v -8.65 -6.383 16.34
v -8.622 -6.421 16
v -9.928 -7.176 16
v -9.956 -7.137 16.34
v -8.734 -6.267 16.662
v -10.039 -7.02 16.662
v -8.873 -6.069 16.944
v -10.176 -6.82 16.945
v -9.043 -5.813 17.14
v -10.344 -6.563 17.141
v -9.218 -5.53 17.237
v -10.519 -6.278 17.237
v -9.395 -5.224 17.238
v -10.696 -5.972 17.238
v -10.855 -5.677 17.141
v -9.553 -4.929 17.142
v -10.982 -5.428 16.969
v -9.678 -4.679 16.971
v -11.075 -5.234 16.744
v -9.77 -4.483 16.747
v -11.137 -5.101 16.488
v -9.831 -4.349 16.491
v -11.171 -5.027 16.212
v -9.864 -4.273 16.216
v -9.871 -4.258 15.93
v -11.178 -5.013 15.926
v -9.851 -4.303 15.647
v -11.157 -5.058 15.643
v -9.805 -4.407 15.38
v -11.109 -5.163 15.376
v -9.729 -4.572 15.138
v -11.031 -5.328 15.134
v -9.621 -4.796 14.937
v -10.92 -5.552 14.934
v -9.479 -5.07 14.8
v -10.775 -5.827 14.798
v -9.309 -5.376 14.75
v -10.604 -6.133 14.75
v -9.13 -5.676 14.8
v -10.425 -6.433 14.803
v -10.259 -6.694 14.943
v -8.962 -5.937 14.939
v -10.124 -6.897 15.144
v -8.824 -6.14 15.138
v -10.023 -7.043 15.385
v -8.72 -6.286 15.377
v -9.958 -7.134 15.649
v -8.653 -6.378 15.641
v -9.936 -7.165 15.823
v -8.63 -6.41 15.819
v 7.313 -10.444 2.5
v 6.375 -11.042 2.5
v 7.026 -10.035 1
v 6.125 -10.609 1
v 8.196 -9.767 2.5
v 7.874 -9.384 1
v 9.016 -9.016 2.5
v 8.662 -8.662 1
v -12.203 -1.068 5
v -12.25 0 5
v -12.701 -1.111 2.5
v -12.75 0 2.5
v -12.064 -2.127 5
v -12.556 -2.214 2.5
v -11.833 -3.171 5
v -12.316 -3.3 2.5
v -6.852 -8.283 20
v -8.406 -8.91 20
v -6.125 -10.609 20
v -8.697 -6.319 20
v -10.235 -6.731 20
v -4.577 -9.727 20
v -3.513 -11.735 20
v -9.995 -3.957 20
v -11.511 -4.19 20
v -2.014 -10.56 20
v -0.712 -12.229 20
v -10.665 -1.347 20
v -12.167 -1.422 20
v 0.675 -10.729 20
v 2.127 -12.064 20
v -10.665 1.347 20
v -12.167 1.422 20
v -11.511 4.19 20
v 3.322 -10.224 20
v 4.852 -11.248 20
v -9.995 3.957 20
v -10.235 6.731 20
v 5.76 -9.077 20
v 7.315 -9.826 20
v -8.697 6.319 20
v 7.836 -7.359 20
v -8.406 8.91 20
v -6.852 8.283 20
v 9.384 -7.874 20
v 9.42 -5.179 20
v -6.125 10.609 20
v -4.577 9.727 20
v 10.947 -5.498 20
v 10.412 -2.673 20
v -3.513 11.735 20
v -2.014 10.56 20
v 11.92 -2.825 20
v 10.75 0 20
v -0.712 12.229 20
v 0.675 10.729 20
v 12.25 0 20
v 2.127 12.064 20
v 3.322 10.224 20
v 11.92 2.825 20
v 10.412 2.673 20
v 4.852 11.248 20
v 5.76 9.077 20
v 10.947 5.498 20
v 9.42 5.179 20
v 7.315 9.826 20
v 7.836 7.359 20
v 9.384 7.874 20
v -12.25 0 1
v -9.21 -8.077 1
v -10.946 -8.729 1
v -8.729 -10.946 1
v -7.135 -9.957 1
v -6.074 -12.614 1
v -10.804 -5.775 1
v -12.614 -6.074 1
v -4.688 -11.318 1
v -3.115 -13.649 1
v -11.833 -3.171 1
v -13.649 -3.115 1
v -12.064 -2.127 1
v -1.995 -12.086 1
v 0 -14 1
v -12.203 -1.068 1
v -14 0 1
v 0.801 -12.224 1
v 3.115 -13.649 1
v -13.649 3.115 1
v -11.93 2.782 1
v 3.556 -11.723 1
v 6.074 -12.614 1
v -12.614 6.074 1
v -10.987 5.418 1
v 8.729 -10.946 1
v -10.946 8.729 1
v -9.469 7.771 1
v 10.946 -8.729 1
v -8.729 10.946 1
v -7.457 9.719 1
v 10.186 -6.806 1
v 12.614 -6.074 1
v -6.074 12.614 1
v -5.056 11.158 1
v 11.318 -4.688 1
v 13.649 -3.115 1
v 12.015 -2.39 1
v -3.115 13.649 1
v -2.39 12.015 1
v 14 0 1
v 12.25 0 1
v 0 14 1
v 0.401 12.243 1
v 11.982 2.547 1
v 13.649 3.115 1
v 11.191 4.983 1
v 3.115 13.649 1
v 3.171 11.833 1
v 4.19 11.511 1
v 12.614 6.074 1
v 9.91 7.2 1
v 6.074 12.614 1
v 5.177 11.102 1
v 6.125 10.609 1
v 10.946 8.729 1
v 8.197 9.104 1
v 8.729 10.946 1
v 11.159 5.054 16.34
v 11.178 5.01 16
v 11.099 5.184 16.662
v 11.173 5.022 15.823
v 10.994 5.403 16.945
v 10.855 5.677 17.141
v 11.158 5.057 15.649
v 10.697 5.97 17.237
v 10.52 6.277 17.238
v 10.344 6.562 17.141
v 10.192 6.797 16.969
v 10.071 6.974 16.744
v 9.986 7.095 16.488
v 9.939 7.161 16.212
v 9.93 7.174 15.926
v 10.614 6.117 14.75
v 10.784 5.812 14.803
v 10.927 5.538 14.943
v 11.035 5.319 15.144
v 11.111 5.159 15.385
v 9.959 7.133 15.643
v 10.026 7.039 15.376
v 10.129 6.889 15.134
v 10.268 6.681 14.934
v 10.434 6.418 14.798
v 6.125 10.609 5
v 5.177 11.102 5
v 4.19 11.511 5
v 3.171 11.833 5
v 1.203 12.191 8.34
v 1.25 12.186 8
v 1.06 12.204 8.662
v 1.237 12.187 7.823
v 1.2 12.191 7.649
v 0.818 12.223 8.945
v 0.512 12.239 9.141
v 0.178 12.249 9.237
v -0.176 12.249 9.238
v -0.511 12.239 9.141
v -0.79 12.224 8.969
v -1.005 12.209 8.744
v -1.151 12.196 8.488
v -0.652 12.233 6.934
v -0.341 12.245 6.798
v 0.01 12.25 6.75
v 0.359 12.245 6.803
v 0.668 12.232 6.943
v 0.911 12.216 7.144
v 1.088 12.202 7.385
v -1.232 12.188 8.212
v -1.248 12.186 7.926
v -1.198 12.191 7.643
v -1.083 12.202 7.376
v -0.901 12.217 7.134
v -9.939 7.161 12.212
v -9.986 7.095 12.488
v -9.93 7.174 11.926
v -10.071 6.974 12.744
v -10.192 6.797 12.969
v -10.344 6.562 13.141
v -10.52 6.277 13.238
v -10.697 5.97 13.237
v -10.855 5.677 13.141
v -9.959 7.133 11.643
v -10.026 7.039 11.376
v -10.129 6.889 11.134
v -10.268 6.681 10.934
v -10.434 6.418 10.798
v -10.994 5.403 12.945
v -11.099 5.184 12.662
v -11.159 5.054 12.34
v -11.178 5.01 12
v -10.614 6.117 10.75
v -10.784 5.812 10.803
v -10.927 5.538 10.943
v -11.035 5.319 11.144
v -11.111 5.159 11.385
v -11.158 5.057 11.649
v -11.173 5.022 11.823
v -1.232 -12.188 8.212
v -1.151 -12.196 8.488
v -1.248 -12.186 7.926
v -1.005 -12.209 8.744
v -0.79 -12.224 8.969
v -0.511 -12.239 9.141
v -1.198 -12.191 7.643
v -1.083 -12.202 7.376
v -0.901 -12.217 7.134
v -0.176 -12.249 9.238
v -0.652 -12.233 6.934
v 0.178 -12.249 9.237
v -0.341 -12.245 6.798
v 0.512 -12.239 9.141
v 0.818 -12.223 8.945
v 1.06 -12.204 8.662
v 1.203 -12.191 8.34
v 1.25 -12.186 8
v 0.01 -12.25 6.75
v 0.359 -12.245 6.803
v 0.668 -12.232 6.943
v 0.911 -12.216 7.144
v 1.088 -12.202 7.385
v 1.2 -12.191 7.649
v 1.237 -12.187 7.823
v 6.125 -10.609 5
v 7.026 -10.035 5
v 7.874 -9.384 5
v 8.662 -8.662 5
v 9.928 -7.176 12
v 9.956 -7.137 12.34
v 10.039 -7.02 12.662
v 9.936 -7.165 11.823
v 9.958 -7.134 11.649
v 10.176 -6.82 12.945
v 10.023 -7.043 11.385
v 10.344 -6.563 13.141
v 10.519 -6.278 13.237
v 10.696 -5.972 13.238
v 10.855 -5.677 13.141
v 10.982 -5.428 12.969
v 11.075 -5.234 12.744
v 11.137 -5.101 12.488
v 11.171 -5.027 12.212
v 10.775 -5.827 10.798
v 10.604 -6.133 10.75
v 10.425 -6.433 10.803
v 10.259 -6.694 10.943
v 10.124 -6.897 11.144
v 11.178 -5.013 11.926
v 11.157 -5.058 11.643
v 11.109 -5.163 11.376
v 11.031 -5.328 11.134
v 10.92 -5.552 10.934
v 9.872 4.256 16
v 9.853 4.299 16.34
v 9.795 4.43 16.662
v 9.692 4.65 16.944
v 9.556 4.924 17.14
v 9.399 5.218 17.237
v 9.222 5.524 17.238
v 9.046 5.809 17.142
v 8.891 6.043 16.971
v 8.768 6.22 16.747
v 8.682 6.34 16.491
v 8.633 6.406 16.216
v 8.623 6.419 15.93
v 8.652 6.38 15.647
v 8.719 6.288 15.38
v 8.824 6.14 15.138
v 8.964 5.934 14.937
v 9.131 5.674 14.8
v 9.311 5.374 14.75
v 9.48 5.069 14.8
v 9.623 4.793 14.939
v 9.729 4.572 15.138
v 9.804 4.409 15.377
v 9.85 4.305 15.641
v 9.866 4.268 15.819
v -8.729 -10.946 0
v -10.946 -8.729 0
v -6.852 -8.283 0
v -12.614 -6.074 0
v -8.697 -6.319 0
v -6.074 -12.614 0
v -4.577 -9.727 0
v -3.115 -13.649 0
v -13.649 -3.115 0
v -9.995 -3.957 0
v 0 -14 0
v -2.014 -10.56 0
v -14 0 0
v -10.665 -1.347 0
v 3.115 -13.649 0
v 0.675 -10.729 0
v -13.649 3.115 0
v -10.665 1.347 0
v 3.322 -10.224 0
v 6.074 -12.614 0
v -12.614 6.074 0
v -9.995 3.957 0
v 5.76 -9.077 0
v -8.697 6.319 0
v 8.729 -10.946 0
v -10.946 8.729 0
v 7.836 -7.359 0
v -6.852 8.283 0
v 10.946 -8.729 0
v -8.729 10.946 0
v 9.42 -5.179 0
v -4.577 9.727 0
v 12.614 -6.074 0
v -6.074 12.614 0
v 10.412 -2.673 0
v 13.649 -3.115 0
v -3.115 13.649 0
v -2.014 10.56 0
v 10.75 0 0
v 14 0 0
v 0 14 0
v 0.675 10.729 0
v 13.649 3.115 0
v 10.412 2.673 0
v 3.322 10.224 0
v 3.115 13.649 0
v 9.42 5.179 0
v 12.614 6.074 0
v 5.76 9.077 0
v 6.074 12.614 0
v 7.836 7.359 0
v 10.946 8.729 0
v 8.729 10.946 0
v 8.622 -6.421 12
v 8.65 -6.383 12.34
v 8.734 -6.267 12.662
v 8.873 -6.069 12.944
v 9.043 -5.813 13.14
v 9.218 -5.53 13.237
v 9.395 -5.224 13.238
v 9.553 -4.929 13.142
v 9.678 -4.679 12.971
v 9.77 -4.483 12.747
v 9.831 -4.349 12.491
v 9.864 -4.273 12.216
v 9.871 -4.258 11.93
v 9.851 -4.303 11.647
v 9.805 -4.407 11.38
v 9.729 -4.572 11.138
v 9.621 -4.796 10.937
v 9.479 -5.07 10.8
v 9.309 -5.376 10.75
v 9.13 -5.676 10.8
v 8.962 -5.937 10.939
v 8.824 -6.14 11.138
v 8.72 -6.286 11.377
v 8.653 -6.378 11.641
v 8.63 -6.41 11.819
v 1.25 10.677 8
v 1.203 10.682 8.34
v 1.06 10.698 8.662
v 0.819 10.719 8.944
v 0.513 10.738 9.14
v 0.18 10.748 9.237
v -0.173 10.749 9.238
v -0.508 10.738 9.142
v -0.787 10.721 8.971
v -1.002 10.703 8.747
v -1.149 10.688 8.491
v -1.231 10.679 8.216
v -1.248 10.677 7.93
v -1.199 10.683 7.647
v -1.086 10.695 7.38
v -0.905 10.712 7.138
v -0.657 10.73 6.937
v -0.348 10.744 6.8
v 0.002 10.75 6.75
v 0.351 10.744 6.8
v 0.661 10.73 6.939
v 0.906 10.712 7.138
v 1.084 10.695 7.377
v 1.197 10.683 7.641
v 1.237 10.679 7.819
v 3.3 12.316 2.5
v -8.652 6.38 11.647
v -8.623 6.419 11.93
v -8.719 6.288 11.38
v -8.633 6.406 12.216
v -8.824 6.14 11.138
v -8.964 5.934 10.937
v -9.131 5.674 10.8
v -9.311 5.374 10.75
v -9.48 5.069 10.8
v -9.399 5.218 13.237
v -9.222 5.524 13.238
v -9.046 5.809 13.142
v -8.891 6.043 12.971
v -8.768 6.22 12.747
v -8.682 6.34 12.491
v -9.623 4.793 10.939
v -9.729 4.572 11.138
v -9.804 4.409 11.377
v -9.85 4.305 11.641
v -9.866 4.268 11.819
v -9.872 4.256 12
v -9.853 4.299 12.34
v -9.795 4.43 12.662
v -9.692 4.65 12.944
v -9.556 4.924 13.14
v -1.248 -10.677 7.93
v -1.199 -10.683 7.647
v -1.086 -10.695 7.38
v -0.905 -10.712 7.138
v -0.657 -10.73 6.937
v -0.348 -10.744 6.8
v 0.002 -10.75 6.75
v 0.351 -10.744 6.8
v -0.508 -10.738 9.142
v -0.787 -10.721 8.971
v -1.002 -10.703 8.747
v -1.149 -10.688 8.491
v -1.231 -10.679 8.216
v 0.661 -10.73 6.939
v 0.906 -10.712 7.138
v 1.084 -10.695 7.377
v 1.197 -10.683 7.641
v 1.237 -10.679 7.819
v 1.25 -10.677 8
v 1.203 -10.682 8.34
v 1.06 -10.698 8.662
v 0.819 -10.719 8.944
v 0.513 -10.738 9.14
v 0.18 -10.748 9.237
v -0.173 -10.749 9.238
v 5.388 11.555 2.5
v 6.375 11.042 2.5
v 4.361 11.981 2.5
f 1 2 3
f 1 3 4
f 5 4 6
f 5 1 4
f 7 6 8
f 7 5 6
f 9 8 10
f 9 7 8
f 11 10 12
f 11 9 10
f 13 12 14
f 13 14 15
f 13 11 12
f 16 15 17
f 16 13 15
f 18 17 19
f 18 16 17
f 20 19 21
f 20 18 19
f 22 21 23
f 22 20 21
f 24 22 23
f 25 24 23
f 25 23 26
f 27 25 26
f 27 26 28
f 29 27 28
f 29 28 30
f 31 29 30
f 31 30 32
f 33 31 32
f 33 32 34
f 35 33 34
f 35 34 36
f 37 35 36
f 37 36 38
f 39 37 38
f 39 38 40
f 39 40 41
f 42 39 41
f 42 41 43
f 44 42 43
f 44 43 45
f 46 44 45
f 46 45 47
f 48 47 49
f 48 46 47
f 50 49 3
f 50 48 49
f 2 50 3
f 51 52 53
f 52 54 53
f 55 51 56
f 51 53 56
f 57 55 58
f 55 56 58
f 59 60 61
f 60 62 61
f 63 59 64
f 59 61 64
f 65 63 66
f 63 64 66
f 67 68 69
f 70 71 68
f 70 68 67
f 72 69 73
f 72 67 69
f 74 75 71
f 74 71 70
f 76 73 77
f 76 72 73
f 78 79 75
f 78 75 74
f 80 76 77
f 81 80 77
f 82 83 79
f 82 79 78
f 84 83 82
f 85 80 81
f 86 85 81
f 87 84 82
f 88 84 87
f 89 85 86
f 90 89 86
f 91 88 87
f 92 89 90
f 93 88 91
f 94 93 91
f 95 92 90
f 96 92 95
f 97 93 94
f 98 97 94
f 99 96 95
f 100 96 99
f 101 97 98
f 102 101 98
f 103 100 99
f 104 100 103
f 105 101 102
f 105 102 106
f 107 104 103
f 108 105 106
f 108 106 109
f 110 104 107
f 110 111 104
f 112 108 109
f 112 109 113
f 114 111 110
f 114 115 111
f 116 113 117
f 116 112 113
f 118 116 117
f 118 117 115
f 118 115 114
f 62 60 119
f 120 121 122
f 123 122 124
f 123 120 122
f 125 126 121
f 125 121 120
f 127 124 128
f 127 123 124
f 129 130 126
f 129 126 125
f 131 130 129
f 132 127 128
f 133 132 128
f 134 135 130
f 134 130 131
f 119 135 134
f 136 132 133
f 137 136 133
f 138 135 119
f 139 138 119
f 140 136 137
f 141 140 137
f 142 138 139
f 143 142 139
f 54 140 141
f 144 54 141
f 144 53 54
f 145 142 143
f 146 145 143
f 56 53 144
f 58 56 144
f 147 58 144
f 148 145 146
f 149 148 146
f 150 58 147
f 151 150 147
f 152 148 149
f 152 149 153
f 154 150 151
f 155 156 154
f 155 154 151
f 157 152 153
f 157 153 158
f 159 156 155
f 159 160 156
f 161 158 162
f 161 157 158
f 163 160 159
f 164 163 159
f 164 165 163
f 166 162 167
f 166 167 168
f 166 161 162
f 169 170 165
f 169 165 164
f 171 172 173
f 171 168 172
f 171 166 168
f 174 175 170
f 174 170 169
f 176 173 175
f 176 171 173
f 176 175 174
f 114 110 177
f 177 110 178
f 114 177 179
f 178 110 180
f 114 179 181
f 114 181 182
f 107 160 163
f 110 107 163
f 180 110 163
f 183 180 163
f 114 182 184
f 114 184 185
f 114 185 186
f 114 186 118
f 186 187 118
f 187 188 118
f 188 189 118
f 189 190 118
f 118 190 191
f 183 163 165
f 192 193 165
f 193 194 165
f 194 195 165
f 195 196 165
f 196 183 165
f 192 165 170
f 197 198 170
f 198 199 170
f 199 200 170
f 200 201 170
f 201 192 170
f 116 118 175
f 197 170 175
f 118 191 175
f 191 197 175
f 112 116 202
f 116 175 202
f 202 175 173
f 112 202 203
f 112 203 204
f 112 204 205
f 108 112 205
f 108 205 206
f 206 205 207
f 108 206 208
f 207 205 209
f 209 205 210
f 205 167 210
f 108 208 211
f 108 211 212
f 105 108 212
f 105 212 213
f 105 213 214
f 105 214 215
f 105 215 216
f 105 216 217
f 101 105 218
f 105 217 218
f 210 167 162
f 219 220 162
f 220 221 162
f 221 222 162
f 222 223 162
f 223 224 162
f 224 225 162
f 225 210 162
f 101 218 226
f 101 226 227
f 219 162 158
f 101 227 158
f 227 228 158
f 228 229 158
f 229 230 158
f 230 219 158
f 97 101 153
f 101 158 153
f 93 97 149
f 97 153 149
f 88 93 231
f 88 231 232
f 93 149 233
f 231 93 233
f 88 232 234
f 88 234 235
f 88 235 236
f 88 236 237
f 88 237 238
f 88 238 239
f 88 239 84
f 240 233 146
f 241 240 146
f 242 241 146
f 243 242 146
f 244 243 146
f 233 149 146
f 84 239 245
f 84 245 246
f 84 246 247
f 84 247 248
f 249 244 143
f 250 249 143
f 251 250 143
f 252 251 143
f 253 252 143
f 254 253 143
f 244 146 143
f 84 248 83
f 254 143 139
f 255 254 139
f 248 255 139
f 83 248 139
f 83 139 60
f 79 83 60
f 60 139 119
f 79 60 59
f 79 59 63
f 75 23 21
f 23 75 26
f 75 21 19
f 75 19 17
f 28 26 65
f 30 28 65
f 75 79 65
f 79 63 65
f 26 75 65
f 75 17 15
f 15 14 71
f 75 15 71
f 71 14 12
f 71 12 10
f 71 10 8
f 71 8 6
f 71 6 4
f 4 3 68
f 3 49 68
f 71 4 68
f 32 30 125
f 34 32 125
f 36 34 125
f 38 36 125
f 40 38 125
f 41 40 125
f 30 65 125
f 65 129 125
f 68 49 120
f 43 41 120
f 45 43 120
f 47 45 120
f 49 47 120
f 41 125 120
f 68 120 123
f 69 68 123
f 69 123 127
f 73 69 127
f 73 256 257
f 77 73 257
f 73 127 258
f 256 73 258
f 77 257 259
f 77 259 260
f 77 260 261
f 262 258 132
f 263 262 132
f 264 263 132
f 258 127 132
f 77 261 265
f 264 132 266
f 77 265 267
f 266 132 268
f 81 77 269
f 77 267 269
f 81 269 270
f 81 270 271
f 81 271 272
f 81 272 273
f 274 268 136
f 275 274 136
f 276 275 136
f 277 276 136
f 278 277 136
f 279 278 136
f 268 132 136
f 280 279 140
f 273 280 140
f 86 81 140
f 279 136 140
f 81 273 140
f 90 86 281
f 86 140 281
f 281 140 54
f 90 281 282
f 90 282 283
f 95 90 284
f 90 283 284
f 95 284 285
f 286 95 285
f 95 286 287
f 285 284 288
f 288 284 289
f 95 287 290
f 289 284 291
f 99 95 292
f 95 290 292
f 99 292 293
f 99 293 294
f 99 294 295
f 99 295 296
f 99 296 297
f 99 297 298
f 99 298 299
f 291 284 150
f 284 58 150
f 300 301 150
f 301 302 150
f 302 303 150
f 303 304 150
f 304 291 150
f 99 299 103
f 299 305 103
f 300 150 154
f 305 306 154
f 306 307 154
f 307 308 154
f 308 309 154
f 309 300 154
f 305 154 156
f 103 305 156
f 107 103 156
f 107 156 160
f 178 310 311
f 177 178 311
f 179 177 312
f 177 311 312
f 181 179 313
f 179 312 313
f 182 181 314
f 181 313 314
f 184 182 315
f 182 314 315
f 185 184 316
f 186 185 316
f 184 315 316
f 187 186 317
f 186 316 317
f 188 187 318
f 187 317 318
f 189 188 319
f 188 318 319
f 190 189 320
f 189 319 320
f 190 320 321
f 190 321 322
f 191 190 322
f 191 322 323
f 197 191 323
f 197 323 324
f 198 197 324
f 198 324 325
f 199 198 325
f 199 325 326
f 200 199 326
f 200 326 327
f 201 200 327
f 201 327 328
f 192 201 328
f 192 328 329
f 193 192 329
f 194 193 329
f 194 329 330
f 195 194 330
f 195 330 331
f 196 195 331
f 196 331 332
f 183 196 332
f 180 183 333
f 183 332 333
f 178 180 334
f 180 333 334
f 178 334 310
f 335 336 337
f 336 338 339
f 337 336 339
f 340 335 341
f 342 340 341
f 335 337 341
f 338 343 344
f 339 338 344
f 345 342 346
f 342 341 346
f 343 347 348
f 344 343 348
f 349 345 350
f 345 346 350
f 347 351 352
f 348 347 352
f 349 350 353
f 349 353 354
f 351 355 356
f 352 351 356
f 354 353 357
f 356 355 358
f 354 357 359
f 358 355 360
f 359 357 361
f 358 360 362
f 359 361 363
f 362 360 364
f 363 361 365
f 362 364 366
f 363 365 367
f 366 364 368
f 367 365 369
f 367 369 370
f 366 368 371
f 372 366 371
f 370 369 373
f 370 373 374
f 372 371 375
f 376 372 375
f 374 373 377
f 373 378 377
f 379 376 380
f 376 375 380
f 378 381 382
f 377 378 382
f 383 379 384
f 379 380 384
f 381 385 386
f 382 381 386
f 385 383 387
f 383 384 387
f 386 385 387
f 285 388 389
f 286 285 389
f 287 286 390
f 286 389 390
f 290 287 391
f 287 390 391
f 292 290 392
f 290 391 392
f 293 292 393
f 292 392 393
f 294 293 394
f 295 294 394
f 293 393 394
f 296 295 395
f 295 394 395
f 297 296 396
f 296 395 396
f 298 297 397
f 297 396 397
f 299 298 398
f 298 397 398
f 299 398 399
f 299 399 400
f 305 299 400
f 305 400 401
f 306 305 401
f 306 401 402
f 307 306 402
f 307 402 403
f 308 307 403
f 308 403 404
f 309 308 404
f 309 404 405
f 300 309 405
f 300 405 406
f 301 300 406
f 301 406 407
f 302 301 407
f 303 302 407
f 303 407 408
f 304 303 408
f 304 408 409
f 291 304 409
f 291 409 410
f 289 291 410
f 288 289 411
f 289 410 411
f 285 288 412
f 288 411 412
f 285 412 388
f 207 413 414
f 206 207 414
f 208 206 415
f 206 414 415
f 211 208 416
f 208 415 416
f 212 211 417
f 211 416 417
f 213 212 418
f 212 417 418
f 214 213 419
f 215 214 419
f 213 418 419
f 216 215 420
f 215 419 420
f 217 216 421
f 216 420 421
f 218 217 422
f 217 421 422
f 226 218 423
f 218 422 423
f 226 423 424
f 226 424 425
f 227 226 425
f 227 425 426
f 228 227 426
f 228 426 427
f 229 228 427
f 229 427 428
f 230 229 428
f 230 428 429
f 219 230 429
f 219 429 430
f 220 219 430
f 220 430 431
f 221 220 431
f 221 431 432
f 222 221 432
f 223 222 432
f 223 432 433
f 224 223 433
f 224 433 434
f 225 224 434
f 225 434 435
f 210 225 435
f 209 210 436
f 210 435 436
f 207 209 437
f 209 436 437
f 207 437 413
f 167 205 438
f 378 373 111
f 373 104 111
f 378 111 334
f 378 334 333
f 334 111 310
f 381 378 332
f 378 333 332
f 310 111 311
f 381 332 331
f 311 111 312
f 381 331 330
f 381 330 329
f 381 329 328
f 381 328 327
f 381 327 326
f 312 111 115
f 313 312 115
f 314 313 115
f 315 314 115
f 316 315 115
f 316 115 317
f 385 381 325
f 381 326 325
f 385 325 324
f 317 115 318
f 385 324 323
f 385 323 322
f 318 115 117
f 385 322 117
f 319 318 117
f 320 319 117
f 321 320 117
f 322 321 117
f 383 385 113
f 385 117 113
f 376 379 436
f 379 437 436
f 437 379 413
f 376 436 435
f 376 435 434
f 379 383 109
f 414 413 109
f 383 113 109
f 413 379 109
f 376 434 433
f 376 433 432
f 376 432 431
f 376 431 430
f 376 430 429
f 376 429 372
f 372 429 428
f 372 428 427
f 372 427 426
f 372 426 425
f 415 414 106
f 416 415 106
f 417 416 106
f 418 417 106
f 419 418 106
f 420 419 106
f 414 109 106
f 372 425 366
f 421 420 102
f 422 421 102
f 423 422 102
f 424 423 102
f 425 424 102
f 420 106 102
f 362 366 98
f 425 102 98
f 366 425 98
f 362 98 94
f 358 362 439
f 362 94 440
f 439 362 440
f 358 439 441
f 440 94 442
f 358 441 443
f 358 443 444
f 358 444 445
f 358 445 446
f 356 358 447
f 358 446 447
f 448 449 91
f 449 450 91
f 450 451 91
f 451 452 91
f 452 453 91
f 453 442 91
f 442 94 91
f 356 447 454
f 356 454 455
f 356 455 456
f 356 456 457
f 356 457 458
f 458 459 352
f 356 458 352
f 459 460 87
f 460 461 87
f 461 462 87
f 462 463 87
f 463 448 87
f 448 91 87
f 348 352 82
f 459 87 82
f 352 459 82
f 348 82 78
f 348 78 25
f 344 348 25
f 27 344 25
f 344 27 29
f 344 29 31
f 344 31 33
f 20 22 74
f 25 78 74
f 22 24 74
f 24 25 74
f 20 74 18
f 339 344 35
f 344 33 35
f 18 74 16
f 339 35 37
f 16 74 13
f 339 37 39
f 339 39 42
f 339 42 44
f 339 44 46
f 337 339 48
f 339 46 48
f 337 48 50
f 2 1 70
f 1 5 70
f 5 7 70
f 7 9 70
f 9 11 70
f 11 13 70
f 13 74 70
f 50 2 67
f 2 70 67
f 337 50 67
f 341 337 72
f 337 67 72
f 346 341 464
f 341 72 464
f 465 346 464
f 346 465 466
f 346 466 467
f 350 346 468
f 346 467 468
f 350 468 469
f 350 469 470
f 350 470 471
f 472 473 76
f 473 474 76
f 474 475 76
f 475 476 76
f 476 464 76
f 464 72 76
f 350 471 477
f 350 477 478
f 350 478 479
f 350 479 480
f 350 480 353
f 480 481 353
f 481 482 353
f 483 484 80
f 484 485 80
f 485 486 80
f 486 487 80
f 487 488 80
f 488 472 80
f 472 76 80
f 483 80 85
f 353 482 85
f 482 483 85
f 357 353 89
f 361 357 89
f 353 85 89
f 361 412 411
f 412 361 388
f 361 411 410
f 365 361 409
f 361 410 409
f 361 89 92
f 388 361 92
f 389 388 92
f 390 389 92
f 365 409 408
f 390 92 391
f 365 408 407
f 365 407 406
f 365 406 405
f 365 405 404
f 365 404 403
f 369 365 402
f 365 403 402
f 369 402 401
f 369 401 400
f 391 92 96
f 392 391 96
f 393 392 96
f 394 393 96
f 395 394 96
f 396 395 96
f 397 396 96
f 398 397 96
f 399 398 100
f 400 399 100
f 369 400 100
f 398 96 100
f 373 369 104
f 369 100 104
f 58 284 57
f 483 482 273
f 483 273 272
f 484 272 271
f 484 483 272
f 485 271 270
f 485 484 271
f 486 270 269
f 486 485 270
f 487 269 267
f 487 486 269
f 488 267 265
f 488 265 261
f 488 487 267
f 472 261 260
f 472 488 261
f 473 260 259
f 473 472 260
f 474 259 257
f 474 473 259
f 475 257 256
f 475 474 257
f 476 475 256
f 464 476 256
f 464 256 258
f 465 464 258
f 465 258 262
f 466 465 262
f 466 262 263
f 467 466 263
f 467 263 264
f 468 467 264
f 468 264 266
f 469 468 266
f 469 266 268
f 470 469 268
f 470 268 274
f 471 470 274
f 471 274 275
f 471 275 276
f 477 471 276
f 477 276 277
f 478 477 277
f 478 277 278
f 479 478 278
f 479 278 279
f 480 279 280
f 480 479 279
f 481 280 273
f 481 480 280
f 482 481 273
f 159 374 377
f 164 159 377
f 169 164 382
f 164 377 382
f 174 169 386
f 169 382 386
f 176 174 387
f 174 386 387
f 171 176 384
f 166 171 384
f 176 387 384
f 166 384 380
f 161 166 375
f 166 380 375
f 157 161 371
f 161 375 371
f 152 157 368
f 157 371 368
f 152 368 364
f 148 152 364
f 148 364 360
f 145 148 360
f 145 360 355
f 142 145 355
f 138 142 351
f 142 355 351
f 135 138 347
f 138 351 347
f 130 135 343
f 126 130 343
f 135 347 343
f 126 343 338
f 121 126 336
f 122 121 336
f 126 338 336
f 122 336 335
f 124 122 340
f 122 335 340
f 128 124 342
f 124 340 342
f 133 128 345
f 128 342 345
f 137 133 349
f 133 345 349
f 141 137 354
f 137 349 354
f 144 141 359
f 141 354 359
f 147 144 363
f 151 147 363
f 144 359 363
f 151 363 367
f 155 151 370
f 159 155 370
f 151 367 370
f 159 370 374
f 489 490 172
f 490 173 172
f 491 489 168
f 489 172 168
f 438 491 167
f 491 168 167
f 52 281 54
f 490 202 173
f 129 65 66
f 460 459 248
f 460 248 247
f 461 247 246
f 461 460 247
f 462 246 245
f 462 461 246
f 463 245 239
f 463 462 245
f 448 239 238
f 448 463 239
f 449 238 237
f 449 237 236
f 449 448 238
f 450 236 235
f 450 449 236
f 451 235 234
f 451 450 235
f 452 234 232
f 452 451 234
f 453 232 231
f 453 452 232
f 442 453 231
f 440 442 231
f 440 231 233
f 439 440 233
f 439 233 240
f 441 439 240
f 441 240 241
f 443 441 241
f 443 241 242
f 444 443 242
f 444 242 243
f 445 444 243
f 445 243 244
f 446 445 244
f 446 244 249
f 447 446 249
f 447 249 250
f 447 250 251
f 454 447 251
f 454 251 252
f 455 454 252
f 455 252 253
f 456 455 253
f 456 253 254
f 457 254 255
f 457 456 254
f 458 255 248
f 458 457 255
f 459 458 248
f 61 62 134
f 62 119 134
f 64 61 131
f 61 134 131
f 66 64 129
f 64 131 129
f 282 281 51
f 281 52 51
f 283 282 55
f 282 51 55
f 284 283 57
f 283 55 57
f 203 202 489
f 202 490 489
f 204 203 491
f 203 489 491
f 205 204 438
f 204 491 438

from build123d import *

# Parameters (mm, degrees)
F0_R           = 14
F1_DEPTH       = 1
F2_R           = 12.25
F3_DEPTH       = 20
F5_R           = 10.75
F6_DEPTH       = 25
F10_R          = 1.25
F11_DEPTH      = 14.001
F11_DEPTH_BACK = 25
F12_R          = 1.25
F13_DEPTH      = 25
F13_DEPTH_BACK = 25
F14_R          = 1.25
F15_DEPTH      = 25
F15_DEPTH_BACK = 25
F16_DEPTH      = 10
F18_ANGLE      = 15
F19_COUNT      = 3


with BuildPart() as f1:
    # F0 (on Top) → F1 (new body)
    with BuildSketch(Plane.XY):
        Circle(F0_R)
    extrude(amount=F1_DEPTH)


with BuildPart() as f3:
    # F2 (on Top) → F3 (new body)
    with BuildSketch(Plane.XY):
        Circle(F2_R)
    extrude(amount=F3_DEPTH)

    # F5 (on offset) → F6 (cut)
    with BuildSketch(Plane.XY.offset(1)):
        Circle(F5_R)
    extrude(amount=F6_DEPTH, mode=Mode.SUBTRACT)

    # F10 (on Front) → F11 (cut, two sides)
    with BuildSketch(Plane.XZ) as f11_sk:
        with Locations((0, 8)):
            Circle(F10_R)
    extrude(amount=-F11_DEPTH, mode=Mode.SUBTRACT)
    extrude(f11_sk.sketch, amount=F11_DEPTH_BACK, mode=Mode.SUBTRACT)

    # F12 (on line) → F13 (cut, two sides)
    with BuildSketch(Plane(origin=(0, 0, 0), x_dir=(-0.5, -0.8660254038, 0), z_dir=(-0.8660254038, 0.5, 0))) as f13_sk:
        with Locations((0, 12)):
            Circle(F12_R)
    extrude(amount=-F13_DEPTH, mode=Mode.SUBTRACT)
    extrude(f13_sk.sketch, amount=F13_DEPTH_BACK, mode=Mode.SUBTRACT)

    # F14 (on line) → F15 (cut, two sides)
    with BuildSketch(Plane(origin=(0, 0, 0), x_dir=(0.5, -0.8660254038, 0), z_dir=(-0.8660254038, -0.5, 0))) as f15_sk:
        with Locations((0, 16)):
            Circle(F14_R)
    extrude(amount=-F15_DEPTH, mode=Mode.SUBTRACT)
    extrude(f15_sk.sketch, amount=F15_DEPTH_BACK, mode=Mode.SUBTRACT)


with BuildPart() as f16_tool:
    # F5 (on offset) → F16 (new body)
    with BuildSketch(Plane.XY.offset(1)):
        Circle(F5_R)
    extrude(amount=-F16_DEPTH)


with BuildPart() as f1_1:
    add(f1.part)

    # F16: cut by f16_tool
    add(f16_tool.part, mode=Mode.SUBTRACT)



with BuildPart() as f3_1:
    add(f3.part)

    # F16: cut by f16_tool
    add(f16_tool.part, mode=Mode.SUBTRACT)


with BuildPart() as f18:
    # F17 (on Front) → F18 (revolve)
    with BuildSketch(Plane.XZ):
        Polygon((-12.75, 2.5), (-12.25, 1), (-12.25, 5), align=None)
    revolve(axis=Axis((0, 0, 28.278902173), (0, 0, 1)), revolution_arc=F18_ANGLE)


with BuildPart() as f1_2:
    add(f1_1.part)

    add(f3_1.part)  # F19 merges F3

    add(f18.part)  # F19 merges F18
    # F19: F18 ×3 about axis
    f19_axis = Axis((0, 0, 28.278902173), (0, 0, 1))
    for i in range(1, F19_COUNT):
        add(f18.part.rotate(f19_axis, i * 360 / F19_COUNT))


solid = f1_2.part
